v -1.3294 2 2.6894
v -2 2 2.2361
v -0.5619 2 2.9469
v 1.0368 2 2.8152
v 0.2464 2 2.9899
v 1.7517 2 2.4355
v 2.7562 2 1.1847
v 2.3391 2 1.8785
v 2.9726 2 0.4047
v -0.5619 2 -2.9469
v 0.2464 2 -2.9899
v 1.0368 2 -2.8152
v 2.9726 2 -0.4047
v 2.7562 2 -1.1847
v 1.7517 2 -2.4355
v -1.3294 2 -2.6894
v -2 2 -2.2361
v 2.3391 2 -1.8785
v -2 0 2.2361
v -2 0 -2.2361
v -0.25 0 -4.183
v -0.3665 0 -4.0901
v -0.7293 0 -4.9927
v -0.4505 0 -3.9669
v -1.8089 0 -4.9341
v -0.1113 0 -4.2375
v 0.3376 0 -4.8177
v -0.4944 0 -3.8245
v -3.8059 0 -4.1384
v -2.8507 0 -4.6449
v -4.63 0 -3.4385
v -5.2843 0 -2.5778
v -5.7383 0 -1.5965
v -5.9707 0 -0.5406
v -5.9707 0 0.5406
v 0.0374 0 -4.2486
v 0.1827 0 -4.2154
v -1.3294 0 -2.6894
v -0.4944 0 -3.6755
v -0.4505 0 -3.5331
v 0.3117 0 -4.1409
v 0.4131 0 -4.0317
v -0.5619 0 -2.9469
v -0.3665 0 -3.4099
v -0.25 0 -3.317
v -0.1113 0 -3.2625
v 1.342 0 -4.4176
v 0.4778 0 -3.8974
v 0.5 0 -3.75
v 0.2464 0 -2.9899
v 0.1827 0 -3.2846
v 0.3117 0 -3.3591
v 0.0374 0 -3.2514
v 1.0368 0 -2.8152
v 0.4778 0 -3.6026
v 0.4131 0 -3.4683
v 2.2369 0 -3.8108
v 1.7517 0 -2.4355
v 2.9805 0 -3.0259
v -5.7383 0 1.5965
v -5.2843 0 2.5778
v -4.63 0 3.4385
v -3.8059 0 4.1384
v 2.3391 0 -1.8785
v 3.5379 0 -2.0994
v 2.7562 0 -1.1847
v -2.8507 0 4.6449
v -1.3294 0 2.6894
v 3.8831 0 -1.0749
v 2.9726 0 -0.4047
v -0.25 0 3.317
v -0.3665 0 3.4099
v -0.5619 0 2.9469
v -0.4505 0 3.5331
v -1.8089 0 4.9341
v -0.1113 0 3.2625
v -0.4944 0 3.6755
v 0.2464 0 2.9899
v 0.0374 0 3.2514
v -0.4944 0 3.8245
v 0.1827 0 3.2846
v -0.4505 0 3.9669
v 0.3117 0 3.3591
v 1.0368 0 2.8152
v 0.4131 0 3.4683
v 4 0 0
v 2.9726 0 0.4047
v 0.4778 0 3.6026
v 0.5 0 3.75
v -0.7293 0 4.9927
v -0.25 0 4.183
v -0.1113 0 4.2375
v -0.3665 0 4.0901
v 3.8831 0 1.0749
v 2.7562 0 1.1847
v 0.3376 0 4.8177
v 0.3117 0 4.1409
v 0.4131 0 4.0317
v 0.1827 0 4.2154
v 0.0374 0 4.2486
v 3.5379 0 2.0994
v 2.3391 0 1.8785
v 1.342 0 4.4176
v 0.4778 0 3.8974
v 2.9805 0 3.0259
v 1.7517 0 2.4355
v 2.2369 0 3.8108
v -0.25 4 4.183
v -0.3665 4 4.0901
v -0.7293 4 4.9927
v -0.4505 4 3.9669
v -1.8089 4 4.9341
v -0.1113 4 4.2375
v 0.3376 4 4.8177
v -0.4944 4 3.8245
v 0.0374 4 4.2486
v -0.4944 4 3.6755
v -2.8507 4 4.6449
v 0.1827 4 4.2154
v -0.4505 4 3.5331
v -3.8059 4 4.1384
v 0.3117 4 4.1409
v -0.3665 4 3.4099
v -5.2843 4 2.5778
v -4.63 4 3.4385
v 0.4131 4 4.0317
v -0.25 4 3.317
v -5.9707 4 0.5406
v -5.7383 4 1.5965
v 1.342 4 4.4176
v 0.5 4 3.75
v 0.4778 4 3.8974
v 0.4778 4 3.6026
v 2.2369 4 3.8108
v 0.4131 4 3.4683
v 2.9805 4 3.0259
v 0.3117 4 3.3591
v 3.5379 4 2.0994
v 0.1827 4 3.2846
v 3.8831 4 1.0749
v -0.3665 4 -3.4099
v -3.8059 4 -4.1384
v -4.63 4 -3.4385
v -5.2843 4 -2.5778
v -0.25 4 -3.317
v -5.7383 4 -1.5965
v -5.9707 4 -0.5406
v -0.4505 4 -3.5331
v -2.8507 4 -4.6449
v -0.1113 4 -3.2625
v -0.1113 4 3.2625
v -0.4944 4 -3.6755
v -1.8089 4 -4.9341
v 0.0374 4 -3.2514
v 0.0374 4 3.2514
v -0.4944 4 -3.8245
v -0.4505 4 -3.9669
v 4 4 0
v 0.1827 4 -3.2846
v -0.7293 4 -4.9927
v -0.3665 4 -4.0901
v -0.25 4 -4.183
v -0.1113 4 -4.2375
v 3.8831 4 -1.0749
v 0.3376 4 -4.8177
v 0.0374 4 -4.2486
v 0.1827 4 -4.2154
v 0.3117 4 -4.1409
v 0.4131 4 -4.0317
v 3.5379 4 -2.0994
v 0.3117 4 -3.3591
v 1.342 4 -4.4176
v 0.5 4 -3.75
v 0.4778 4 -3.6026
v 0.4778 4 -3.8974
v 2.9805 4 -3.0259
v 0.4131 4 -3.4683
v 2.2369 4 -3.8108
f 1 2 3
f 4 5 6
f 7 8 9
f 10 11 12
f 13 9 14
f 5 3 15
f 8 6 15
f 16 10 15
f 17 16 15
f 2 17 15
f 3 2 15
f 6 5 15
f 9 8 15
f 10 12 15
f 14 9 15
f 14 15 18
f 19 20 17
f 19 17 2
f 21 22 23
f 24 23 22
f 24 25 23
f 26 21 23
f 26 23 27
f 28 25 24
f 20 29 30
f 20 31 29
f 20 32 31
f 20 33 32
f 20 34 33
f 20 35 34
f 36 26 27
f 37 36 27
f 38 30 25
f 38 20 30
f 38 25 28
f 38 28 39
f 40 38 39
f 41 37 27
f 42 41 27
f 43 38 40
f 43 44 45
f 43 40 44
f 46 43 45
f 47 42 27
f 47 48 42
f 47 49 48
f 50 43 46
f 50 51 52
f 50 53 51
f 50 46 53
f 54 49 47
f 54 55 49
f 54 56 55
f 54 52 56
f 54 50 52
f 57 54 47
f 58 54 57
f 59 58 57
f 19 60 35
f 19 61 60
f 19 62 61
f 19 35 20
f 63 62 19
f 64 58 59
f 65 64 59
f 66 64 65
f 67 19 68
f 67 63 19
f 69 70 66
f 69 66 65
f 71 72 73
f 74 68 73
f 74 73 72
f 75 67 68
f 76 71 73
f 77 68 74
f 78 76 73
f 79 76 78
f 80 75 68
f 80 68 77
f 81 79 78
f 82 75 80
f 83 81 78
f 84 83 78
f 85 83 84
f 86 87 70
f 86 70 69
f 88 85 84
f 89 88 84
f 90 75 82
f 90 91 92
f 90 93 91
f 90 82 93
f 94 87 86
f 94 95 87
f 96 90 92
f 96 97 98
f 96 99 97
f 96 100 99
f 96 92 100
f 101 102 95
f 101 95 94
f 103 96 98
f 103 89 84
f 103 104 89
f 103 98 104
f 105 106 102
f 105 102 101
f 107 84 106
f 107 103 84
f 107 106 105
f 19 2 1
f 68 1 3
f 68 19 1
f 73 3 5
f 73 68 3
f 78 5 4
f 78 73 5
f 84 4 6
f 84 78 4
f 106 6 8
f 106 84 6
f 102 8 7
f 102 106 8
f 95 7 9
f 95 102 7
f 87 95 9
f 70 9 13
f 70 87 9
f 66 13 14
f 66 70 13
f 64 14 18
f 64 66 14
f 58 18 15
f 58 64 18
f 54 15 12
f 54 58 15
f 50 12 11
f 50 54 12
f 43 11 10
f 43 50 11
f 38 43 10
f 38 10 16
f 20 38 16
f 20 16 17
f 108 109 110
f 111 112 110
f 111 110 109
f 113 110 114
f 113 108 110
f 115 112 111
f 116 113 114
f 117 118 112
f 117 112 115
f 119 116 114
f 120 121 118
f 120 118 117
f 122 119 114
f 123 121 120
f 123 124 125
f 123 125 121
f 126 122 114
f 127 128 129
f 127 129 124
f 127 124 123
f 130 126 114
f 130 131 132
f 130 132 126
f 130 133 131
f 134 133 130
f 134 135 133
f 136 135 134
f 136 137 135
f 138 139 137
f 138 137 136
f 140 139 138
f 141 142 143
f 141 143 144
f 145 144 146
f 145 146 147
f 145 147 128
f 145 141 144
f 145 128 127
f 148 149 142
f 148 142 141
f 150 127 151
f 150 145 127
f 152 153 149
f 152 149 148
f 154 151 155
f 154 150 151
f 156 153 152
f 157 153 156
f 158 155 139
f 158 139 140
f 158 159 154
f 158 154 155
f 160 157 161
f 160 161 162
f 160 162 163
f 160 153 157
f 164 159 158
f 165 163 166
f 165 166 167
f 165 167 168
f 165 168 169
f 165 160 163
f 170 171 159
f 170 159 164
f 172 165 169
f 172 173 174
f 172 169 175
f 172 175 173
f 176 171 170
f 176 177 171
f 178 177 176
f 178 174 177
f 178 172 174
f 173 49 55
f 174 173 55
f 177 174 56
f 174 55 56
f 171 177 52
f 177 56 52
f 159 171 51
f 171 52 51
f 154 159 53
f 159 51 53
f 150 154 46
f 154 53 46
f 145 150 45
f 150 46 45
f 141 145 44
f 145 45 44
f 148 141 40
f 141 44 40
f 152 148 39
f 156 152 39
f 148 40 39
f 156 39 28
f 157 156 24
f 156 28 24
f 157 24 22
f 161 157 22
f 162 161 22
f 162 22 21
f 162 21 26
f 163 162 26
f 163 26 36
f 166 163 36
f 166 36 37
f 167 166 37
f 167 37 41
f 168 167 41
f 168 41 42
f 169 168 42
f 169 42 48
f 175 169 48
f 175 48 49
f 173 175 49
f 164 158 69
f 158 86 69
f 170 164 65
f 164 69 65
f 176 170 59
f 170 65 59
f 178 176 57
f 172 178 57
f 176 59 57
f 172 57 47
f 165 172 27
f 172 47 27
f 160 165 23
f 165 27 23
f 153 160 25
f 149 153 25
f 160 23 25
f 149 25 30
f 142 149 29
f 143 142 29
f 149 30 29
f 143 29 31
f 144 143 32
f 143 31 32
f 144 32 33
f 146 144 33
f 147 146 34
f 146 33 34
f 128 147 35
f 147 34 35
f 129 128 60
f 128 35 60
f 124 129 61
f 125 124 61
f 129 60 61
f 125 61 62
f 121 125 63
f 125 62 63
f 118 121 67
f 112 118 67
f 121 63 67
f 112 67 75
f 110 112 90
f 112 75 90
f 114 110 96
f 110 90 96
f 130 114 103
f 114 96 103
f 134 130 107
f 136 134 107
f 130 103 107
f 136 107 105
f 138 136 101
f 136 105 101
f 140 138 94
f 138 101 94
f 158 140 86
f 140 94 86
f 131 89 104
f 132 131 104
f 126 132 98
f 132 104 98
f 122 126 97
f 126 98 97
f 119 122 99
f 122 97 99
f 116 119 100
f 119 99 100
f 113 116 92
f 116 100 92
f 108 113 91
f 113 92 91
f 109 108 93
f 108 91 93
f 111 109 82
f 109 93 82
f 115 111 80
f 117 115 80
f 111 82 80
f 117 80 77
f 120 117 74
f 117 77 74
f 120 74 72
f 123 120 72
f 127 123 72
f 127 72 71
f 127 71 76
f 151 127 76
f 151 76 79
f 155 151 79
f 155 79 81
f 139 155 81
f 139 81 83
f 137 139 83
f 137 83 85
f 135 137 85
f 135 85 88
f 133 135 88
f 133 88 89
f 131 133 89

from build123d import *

# Parameters (mm, degrees)
SKETCH1_R           = 5
SKETCH1_R_2         = 3
BOSS_EXTRUDE1_DEPTH = 2
SKETCH2_R           = 5
BOSS_EXTRUDE2_DEPTH = 2
SKETCH3_R           = 0.5
CUT_EXTRUDE1_DEPTH  = 5
BOSS_EXTRUDE3_DEPTH = 4


with BuildPart() as part:
    # Sketch1 → Boss-Extrude1 (new body)
    with BuildSketch(Plane(origin=(0, 0, 0), x_dir=(1, 0, 0), z_dir=(0, 1, 0))):
        with Locations((-1, 0)):
            Circle(SKETCH1_R)
        Circle(SKETCH1_R_2, mode=Mode.SUBTRACT)
    extrude(amount=BOSS_EXTRUDE1_DEPTH)

    # Sketch2 → Boss-Extrude2 (add)
    with BuildSketch(Plane(origin=(0, 2, 0), x_dir=(1, 0, 0), z_dir=(0, 1, 0))):
        with Locations((-1, 0)):
            Circle(SKETCH2_R)
    extrude(amount=BOSS_EXTRUDE2_DEPTH)

    # Sketch3 → Cut-Extrude1 (cut, through all)
    with BuildSketch(Plane.XZ):
        with Locations((0, 3.75)):
            Circle(SKETCH3_R)
        with Locations((0, -3.75)):
            Circle(SKETCH3_R)
    extrude(amount=-CUT_EXTRUDE1_DEPTH, mode=Mode.SUBTRACT)

    # Sketch4 → Boss-Extrude3 (add)
    with BuildSketch(Plane.XZ):
        with BuildLine():
            ThreePointArc((-2, 2.236067977), (-3, 0), (-2, -2.236067977))
            Line((-2, -2.236067977), (-2, 2.236067977))
        make_face()
    extrude(amount=-BOSS_EXTRUDE3_DEPTH)


solid = part.part
